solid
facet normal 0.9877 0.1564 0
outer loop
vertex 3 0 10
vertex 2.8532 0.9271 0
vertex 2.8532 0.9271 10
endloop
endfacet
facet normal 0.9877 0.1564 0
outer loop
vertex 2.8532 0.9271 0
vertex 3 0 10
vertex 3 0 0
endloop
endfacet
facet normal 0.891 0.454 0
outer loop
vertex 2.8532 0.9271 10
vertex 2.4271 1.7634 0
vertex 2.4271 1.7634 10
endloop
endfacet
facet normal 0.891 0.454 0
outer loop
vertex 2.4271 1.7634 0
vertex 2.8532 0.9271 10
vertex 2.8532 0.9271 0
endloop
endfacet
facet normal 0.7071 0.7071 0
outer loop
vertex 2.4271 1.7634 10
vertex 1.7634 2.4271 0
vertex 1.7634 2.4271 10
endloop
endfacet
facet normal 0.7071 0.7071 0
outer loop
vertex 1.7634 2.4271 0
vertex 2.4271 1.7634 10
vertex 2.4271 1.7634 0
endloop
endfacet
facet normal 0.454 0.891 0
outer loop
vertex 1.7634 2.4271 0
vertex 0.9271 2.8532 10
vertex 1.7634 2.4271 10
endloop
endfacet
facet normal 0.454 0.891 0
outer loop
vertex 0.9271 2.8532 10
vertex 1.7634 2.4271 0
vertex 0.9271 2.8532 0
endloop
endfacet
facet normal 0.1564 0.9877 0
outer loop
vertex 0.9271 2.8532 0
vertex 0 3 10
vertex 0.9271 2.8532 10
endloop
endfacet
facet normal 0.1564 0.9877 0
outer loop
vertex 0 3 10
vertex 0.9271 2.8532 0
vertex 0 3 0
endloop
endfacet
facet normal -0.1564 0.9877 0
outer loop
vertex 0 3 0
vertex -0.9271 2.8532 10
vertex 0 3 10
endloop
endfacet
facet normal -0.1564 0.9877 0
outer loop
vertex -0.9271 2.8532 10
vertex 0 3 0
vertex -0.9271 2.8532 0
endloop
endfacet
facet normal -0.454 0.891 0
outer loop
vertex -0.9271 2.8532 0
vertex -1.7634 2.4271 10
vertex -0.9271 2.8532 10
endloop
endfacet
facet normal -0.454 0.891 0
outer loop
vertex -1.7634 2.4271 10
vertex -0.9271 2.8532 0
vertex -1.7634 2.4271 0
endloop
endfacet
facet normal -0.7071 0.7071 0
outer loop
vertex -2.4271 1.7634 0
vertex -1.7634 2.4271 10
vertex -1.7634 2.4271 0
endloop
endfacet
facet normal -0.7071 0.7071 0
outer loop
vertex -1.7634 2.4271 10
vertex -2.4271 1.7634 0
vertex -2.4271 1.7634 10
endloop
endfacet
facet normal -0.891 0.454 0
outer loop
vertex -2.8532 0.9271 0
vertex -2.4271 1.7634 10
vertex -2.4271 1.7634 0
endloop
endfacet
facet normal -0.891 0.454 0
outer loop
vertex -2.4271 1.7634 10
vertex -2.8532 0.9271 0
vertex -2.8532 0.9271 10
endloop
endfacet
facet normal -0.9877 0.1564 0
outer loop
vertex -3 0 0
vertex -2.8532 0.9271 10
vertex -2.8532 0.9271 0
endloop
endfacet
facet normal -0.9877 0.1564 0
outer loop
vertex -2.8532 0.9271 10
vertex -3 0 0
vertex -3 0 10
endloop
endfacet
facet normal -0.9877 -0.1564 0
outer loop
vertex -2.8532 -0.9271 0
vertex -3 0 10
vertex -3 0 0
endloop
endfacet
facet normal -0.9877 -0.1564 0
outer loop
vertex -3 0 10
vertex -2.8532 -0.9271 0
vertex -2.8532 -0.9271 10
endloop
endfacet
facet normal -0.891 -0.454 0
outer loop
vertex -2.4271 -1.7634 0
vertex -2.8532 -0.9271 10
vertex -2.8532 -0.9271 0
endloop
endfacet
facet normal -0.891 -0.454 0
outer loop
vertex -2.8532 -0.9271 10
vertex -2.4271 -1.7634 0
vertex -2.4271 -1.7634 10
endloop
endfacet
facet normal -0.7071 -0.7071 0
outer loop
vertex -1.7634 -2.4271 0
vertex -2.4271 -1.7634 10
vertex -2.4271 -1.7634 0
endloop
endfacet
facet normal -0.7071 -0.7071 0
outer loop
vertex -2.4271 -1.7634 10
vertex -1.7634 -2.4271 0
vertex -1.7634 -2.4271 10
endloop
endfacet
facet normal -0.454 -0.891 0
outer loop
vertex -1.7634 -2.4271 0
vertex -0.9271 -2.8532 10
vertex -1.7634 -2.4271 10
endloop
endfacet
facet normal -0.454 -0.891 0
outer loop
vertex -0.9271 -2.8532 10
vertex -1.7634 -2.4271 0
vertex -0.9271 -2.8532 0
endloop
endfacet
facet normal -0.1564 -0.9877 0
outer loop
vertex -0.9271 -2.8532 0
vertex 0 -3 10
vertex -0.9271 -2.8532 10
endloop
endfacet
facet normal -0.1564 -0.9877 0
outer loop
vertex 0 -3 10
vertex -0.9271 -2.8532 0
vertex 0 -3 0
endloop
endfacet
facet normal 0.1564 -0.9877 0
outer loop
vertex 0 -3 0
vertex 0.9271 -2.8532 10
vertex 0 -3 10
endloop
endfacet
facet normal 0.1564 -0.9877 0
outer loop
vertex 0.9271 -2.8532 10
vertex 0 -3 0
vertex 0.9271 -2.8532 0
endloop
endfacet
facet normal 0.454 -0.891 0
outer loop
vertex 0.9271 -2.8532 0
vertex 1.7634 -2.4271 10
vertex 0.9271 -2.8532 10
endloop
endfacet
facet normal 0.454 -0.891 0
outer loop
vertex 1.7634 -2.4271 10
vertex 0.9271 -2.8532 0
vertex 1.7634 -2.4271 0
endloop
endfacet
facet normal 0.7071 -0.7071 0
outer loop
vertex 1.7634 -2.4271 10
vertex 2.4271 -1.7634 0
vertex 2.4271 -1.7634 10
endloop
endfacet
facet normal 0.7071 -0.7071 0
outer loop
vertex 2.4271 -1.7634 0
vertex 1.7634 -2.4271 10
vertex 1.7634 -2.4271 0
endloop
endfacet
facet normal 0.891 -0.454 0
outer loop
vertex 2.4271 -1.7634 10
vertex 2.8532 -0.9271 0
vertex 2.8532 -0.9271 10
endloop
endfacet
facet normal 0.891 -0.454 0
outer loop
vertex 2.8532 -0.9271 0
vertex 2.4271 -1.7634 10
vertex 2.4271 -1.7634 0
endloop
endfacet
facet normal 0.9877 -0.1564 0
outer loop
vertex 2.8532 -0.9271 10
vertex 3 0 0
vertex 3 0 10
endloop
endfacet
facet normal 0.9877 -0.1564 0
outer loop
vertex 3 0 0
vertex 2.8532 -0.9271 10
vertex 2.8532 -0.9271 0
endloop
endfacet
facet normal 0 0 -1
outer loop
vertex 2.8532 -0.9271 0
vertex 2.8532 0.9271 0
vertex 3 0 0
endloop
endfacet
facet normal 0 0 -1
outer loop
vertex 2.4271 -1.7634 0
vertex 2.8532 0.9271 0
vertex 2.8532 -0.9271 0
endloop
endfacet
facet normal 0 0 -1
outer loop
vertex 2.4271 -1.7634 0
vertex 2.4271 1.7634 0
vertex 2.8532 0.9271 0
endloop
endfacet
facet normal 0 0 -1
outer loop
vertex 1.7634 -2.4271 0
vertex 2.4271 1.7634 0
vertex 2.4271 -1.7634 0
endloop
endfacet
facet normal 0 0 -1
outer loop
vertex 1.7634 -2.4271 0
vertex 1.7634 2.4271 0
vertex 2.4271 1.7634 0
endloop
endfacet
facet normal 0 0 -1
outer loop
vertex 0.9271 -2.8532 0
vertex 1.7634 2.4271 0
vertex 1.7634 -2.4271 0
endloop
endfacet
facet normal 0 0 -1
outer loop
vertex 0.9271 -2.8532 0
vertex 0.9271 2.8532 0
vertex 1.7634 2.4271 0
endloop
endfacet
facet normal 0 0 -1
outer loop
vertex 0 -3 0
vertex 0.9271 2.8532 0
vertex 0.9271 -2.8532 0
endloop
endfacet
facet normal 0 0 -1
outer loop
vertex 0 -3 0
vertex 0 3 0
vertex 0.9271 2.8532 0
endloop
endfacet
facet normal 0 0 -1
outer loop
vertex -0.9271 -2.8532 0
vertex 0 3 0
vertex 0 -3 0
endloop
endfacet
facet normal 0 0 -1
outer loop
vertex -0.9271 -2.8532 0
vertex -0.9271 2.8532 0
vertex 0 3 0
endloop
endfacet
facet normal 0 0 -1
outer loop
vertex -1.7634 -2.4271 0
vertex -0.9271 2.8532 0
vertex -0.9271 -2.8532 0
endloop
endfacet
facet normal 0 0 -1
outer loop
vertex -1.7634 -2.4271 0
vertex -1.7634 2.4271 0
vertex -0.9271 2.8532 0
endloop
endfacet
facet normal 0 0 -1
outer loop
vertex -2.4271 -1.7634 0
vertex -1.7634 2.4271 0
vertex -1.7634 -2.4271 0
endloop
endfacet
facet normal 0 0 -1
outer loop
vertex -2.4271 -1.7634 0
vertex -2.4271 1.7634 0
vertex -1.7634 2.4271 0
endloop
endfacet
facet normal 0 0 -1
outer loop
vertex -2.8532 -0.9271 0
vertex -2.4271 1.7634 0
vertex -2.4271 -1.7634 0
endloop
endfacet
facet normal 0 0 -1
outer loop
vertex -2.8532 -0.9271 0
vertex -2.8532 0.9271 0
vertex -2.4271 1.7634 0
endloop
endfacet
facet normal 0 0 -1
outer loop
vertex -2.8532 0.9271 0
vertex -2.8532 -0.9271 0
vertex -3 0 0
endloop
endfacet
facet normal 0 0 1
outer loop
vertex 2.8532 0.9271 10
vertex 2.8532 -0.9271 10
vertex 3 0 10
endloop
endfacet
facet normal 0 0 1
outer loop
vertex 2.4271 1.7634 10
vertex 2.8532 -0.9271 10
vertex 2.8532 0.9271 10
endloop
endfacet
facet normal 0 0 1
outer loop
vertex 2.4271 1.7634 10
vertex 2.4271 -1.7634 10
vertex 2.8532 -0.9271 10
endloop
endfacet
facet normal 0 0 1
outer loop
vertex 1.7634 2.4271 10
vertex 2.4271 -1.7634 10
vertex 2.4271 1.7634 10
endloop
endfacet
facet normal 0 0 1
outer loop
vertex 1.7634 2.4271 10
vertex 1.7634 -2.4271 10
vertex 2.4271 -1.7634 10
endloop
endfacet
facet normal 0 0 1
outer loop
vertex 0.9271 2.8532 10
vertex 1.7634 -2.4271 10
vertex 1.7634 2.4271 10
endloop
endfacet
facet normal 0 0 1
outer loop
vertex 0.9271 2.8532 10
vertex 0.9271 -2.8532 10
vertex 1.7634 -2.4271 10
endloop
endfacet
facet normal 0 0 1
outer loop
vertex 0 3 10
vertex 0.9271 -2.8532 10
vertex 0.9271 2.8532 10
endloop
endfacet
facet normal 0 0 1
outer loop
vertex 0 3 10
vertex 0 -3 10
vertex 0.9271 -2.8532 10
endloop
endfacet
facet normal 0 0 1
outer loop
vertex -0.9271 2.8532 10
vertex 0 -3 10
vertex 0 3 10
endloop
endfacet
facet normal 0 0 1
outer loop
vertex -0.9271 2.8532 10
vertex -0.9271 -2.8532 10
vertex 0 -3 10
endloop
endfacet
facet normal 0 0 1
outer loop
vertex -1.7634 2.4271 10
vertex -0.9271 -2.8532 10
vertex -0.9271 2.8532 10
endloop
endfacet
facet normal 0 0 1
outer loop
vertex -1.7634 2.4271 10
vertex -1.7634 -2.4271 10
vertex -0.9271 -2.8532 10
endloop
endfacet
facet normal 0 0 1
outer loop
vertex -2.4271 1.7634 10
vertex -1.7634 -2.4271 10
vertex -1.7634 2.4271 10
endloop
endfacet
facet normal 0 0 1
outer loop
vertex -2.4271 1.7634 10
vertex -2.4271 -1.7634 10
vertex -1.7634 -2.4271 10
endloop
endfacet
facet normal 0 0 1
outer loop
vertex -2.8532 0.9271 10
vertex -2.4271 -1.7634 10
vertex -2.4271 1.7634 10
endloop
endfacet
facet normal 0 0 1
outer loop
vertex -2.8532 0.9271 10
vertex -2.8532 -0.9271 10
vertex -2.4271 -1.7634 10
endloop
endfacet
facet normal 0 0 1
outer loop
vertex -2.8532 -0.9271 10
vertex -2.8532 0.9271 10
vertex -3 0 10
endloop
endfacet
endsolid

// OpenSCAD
// $ variables are DYNAMICALLY scoped: $fn set at the call site must reach inside
module pin() {
  cylinder(h = 10, r = 3);
}
pin($fn = 20);
